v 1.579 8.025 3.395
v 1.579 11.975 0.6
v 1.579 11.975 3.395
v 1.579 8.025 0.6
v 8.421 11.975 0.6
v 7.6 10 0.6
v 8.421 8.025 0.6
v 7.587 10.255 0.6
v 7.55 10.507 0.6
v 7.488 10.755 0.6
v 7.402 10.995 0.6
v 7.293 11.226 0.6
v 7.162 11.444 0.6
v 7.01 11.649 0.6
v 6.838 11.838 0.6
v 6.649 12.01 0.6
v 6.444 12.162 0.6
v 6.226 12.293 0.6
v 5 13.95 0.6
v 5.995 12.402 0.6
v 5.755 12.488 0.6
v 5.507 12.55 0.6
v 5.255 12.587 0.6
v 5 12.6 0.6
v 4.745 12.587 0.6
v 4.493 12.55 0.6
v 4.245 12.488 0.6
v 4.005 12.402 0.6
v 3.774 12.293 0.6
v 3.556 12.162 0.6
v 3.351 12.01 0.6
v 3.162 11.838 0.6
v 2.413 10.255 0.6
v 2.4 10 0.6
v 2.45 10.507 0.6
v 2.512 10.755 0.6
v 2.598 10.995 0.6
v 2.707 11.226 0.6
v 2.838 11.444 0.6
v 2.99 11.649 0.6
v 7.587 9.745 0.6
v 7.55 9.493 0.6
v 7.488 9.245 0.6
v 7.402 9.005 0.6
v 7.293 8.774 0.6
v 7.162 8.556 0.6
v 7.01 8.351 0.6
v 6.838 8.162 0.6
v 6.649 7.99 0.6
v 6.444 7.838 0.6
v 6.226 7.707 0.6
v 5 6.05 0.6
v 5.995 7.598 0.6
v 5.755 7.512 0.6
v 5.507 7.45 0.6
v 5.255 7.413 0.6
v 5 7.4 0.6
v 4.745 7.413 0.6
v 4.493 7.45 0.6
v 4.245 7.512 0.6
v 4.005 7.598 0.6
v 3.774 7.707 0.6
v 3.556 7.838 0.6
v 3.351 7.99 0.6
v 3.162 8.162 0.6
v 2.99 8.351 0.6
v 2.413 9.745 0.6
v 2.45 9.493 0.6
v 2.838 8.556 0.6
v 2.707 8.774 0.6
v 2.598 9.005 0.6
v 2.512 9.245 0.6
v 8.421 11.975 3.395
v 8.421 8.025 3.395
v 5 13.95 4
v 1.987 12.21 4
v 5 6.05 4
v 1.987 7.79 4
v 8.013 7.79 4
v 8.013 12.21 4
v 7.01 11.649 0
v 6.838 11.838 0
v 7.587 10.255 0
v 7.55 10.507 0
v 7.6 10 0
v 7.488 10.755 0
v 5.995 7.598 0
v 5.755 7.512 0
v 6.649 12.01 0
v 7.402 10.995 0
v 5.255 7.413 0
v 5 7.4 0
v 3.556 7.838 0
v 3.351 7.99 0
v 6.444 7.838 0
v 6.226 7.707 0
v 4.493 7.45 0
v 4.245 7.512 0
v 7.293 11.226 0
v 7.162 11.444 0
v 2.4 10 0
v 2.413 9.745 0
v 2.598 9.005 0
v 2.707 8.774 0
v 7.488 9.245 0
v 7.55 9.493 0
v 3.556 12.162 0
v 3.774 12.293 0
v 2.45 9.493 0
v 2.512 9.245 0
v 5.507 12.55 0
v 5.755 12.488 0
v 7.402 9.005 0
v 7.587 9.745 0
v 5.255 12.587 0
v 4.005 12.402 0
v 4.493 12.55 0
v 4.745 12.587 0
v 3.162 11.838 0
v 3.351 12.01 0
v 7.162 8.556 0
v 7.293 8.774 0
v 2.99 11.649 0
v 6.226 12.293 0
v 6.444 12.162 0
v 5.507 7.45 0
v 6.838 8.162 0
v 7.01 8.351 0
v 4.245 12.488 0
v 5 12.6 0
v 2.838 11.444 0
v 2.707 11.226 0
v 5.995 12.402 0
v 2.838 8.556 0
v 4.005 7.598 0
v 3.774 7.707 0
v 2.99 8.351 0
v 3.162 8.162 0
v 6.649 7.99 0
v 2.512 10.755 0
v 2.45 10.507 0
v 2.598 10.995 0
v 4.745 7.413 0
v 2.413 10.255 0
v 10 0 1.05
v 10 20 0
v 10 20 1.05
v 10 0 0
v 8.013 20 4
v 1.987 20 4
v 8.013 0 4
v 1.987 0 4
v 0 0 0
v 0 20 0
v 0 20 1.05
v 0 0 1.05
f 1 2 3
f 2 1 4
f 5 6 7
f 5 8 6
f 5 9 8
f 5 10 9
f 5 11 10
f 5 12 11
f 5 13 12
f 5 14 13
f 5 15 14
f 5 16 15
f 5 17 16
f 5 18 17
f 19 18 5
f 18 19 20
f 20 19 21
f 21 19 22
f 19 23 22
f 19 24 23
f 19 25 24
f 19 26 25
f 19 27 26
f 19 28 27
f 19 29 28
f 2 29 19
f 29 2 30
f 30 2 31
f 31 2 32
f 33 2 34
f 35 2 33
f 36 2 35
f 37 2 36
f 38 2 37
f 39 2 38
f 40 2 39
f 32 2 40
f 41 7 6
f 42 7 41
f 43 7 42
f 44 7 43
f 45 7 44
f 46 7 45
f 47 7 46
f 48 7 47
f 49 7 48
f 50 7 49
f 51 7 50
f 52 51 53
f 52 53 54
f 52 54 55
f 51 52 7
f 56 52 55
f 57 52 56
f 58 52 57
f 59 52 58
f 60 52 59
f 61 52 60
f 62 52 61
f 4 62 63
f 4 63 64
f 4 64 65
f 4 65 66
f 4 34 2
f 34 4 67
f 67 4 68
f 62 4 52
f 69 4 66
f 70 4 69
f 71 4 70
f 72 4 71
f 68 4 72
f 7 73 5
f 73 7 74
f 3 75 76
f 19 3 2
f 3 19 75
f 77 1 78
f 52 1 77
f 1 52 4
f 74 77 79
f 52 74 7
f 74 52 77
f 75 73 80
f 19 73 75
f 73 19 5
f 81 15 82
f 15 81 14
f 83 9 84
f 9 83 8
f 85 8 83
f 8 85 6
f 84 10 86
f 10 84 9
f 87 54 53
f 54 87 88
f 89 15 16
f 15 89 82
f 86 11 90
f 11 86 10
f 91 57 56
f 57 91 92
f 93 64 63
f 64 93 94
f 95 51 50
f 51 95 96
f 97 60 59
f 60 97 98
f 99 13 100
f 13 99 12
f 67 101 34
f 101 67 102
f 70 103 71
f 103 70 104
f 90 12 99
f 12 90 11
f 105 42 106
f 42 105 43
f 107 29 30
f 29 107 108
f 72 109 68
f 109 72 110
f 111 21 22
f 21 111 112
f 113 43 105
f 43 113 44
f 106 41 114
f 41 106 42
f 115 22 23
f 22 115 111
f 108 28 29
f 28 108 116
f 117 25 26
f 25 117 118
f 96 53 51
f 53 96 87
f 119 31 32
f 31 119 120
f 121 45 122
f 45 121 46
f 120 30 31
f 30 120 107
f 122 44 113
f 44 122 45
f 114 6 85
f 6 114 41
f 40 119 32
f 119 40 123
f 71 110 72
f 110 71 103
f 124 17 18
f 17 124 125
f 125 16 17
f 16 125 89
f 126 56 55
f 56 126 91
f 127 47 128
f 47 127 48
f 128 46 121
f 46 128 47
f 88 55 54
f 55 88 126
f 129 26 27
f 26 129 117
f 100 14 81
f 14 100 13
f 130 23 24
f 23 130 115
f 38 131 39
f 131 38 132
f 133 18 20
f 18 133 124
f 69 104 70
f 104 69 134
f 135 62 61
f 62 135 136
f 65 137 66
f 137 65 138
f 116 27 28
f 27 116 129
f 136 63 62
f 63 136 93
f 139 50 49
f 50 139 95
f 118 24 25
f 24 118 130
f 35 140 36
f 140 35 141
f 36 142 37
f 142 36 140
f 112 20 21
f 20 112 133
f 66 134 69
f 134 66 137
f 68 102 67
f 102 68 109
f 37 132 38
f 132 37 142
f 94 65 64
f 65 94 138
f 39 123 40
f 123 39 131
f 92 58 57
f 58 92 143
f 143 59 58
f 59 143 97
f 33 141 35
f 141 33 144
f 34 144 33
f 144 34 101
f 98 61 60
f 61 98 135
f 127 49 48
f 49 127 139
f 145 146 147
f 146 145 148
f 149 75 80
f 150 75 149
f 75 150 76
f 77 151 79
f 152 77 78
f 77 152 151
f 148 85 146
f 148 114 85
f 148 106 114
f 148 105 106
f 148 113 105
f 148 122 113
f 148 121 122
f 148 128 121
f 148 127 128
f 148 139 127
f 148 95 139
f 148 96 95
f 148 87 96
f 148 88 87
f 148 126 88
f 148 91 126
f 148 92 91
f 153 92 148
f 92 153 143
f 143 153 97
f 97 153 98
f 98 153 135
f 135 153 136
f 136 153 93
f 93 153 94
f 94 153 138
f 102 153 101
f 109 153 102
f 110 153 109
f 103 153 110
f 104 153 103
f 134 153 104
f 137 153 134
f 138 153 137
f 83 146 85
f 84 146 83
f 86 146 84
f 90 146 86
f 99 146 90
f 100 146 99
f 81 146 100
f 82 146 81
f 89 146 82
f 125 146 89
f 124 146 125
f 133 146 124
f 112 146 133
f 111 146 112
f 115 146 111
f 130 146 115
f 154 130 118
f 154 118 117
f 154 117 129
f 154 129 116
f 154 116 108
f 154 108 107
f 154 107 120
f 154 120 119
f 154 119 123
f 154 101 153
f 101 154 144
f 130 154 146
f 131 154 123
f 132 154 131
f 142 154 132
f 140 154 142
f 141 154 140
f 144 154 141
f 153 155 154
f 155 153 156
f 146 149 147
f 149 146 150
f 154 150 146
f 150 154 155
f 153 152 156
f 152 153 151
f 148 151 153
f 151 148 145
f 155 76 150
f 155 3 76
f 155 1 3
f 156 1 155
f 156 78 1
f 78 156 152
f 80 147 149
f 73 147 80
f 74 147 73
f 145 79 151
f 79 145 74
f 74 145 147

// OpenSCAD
// Customizer Parameters

$fn=64;

// Create a T-nut for v-slot style extrusions. Defaults for 2020 extrusion with M3 hole.
//
// Arguments:
// length of tnut
length=20;

// how many holes to put in it
holes=1;

// diameter of holes
holesize=5.2;

// distance between hole centers (which are always centered on the nut)
spacing=10;

// depth of nut sink
sink=3.4;

// height of tnut (use 4mm for 2020 extrusion)
height=4;

// width of tnut (use 10mm for 2020 extrusion)
width=10;

// inset distance of bezel (use 3mm for 2020 extrusion)
bezel=2;

// depth of base (negative from z=0); use for slide-on attachments to other parts)
base=0;

// nut parameters
// how many sides on the nut (hex=6)
nutsides=6;
// nutsize = point-to-point size of nut
nutsize=7.90 ;
// amount to rotate (to fit inside body)
nutrotation=30;

// circle optimization
$fn=64;

// include <mygeom.scad>
module rotate_axis(axis, d) {
    rotate(list_for_axis(axis, d)) children();
}

module xrotate(d) {
    rotate_axis("x", d) children();
}

module yrotate(d) {
    rotate_axis("y", d) children();
}

module zrotate(d) {
    rotate_axis("z", d) children();
}

function list_for_axis(axis, d) =
(
    axis=="x" ? [d, 0, 0] : (
        axis=="y" ? [0, d, 0] : (
            axis=="z" ? [0, 0, d] : [0, 0, 0]))
);

module translate_axis(axis, d) {
    translate(list_for_axis(axis, d)) children();
}

module xmove(d) {
    translate_axis("x", d) children();
}

module ymove(d) {
    translate_axis("y", d) children();
}

module zmove(d) {
    translate_axis("z", d) children();
}

module spread_axis(axis, d, n=1) {
    x = d/2;
    if(d==0 || n==0) {
        children();
    }
    else
    {
        for(i=[-x:(d/n):x]) {
            translate_axis(axis, i) children();
        }
    } 
}

module xspread(d, n=1)
{
    spread_axis("x", d, n) children();
}

module yspread(d, n=1)
{
    spread_axis("y", d, n) children();
}


module zspread(d, n=1)
{
    spread_axis("z", d, n) children();
}

module star(points, id, od)
{
    polygon([
        for(i=[0:points*2])
            [
            (i%2==0) ? cos(i*(360/(points*2)))*od/2 : cos(i*(360/(points*2)))*id/2,
            (i%2==0) ? sin(i*(360/(points*2)))*od/2 : sin(i*(360/(points*2)))*id/2
            ]
    ]);
}

module unit_star(points, height, id, od, center=true)
{
    linear_extrude(height, center=center) star(points, id, od);
}

module unit_polygon(r, n)
{
    polygon([
        for(i=[0:360/n:360])
            [ cos(i)*r, sin(i)*r ]
    ]);
}


module screw_hole(size, depth, sinkwidth=5, sinkdepth=0, type="round", center=true) {
    zmove(center ? 0 : depth/2) {
        cylinder(h=depth, d=size, $fn=12, center=true);
        ref=sinkdepth/abs(sinkdepth) * depth/2;
        zmove(ref-sinkdepth/2) {
            if(type=="round") cylinder(h=abs(sinkdepth), d=sinkwidth, $fn=12, center=true);
            if(type=="hex") linear_extrude(height=abs(sinkdepth), center=true) rotate([0, 0, 30]) unit_polygon(sinkwidth/2, 6);
        }
    }
}

module rounded_cube(size, diameter, center=false) {
    hull() {
        xmove((size[0])/2) xspread(size[0]-diameter) ymove((size[1])/2) yspread(size[1]-diameter) cylinder(d=diameter, h=size[2], center=center);
    }
}

module round_chamfer() {
    intersection() {
        cylinder(d=4, h=11, $fn=20);
        cube(size=[2, 2, 11]);
    }
}


// tnut.scad
module tnut(l) {
    difference() {
        union() {
            // nut block
            cube([width, l, height]);
            // base
            zmove(-base) xmove(bezel) cube([width-2*bezel, l, base]);
        }
        // bezels
        ymove(-0.02) rotate([-90, 0, 0]) linear_extrude(height=l+0.04) polygon([ [-0.02, -height/4-0.02], [bezel, -height-0.02], [-0.02, -height-0.02] ]);
        ymove(-0.02) rotate([-90, 0, 0]) linear_extrude(height=l+0.04) polygon([ [width+0.02, -height/4-0.02], [width-bezel, -height-0.02], [width+0.02, -height-0.02] ]);
        // hole and countersink
        ymove(l/2) yspread((holes-1)*spacing, holes-1) xmove(width/2) {
            zmove(height-sink) linear_extrude(height=sink+0.02) rotate([0, 0, nutrotation]) unit_polygon(nutsize/2, nutsides);
            zmove(-base-0.02) cylinder(d=holesize, h=height+base+0.02);
        }
    }
}

// Examples
//tnut(40, holes=4, spacing=10); // 4-hole 40mm

//tnut(40, holes=2, spacing=20); // 2-hole 40mm
//xmove(20) tnut(10); // 1-hole 20mm

//xmove(20) tnut(10); // 1-hole 10mm

//xmove(40) tnut(40, holes=3, spacing=10, base=3); // 3-holes 10mm apart with a 3mm base

// square nut with 6mm diagonal
//xmove(-20) tnut(20, holes=2, spacing=10, nutsides=4, nutrotation=45, nutsize=6);

// Customizer
tnut(length);
